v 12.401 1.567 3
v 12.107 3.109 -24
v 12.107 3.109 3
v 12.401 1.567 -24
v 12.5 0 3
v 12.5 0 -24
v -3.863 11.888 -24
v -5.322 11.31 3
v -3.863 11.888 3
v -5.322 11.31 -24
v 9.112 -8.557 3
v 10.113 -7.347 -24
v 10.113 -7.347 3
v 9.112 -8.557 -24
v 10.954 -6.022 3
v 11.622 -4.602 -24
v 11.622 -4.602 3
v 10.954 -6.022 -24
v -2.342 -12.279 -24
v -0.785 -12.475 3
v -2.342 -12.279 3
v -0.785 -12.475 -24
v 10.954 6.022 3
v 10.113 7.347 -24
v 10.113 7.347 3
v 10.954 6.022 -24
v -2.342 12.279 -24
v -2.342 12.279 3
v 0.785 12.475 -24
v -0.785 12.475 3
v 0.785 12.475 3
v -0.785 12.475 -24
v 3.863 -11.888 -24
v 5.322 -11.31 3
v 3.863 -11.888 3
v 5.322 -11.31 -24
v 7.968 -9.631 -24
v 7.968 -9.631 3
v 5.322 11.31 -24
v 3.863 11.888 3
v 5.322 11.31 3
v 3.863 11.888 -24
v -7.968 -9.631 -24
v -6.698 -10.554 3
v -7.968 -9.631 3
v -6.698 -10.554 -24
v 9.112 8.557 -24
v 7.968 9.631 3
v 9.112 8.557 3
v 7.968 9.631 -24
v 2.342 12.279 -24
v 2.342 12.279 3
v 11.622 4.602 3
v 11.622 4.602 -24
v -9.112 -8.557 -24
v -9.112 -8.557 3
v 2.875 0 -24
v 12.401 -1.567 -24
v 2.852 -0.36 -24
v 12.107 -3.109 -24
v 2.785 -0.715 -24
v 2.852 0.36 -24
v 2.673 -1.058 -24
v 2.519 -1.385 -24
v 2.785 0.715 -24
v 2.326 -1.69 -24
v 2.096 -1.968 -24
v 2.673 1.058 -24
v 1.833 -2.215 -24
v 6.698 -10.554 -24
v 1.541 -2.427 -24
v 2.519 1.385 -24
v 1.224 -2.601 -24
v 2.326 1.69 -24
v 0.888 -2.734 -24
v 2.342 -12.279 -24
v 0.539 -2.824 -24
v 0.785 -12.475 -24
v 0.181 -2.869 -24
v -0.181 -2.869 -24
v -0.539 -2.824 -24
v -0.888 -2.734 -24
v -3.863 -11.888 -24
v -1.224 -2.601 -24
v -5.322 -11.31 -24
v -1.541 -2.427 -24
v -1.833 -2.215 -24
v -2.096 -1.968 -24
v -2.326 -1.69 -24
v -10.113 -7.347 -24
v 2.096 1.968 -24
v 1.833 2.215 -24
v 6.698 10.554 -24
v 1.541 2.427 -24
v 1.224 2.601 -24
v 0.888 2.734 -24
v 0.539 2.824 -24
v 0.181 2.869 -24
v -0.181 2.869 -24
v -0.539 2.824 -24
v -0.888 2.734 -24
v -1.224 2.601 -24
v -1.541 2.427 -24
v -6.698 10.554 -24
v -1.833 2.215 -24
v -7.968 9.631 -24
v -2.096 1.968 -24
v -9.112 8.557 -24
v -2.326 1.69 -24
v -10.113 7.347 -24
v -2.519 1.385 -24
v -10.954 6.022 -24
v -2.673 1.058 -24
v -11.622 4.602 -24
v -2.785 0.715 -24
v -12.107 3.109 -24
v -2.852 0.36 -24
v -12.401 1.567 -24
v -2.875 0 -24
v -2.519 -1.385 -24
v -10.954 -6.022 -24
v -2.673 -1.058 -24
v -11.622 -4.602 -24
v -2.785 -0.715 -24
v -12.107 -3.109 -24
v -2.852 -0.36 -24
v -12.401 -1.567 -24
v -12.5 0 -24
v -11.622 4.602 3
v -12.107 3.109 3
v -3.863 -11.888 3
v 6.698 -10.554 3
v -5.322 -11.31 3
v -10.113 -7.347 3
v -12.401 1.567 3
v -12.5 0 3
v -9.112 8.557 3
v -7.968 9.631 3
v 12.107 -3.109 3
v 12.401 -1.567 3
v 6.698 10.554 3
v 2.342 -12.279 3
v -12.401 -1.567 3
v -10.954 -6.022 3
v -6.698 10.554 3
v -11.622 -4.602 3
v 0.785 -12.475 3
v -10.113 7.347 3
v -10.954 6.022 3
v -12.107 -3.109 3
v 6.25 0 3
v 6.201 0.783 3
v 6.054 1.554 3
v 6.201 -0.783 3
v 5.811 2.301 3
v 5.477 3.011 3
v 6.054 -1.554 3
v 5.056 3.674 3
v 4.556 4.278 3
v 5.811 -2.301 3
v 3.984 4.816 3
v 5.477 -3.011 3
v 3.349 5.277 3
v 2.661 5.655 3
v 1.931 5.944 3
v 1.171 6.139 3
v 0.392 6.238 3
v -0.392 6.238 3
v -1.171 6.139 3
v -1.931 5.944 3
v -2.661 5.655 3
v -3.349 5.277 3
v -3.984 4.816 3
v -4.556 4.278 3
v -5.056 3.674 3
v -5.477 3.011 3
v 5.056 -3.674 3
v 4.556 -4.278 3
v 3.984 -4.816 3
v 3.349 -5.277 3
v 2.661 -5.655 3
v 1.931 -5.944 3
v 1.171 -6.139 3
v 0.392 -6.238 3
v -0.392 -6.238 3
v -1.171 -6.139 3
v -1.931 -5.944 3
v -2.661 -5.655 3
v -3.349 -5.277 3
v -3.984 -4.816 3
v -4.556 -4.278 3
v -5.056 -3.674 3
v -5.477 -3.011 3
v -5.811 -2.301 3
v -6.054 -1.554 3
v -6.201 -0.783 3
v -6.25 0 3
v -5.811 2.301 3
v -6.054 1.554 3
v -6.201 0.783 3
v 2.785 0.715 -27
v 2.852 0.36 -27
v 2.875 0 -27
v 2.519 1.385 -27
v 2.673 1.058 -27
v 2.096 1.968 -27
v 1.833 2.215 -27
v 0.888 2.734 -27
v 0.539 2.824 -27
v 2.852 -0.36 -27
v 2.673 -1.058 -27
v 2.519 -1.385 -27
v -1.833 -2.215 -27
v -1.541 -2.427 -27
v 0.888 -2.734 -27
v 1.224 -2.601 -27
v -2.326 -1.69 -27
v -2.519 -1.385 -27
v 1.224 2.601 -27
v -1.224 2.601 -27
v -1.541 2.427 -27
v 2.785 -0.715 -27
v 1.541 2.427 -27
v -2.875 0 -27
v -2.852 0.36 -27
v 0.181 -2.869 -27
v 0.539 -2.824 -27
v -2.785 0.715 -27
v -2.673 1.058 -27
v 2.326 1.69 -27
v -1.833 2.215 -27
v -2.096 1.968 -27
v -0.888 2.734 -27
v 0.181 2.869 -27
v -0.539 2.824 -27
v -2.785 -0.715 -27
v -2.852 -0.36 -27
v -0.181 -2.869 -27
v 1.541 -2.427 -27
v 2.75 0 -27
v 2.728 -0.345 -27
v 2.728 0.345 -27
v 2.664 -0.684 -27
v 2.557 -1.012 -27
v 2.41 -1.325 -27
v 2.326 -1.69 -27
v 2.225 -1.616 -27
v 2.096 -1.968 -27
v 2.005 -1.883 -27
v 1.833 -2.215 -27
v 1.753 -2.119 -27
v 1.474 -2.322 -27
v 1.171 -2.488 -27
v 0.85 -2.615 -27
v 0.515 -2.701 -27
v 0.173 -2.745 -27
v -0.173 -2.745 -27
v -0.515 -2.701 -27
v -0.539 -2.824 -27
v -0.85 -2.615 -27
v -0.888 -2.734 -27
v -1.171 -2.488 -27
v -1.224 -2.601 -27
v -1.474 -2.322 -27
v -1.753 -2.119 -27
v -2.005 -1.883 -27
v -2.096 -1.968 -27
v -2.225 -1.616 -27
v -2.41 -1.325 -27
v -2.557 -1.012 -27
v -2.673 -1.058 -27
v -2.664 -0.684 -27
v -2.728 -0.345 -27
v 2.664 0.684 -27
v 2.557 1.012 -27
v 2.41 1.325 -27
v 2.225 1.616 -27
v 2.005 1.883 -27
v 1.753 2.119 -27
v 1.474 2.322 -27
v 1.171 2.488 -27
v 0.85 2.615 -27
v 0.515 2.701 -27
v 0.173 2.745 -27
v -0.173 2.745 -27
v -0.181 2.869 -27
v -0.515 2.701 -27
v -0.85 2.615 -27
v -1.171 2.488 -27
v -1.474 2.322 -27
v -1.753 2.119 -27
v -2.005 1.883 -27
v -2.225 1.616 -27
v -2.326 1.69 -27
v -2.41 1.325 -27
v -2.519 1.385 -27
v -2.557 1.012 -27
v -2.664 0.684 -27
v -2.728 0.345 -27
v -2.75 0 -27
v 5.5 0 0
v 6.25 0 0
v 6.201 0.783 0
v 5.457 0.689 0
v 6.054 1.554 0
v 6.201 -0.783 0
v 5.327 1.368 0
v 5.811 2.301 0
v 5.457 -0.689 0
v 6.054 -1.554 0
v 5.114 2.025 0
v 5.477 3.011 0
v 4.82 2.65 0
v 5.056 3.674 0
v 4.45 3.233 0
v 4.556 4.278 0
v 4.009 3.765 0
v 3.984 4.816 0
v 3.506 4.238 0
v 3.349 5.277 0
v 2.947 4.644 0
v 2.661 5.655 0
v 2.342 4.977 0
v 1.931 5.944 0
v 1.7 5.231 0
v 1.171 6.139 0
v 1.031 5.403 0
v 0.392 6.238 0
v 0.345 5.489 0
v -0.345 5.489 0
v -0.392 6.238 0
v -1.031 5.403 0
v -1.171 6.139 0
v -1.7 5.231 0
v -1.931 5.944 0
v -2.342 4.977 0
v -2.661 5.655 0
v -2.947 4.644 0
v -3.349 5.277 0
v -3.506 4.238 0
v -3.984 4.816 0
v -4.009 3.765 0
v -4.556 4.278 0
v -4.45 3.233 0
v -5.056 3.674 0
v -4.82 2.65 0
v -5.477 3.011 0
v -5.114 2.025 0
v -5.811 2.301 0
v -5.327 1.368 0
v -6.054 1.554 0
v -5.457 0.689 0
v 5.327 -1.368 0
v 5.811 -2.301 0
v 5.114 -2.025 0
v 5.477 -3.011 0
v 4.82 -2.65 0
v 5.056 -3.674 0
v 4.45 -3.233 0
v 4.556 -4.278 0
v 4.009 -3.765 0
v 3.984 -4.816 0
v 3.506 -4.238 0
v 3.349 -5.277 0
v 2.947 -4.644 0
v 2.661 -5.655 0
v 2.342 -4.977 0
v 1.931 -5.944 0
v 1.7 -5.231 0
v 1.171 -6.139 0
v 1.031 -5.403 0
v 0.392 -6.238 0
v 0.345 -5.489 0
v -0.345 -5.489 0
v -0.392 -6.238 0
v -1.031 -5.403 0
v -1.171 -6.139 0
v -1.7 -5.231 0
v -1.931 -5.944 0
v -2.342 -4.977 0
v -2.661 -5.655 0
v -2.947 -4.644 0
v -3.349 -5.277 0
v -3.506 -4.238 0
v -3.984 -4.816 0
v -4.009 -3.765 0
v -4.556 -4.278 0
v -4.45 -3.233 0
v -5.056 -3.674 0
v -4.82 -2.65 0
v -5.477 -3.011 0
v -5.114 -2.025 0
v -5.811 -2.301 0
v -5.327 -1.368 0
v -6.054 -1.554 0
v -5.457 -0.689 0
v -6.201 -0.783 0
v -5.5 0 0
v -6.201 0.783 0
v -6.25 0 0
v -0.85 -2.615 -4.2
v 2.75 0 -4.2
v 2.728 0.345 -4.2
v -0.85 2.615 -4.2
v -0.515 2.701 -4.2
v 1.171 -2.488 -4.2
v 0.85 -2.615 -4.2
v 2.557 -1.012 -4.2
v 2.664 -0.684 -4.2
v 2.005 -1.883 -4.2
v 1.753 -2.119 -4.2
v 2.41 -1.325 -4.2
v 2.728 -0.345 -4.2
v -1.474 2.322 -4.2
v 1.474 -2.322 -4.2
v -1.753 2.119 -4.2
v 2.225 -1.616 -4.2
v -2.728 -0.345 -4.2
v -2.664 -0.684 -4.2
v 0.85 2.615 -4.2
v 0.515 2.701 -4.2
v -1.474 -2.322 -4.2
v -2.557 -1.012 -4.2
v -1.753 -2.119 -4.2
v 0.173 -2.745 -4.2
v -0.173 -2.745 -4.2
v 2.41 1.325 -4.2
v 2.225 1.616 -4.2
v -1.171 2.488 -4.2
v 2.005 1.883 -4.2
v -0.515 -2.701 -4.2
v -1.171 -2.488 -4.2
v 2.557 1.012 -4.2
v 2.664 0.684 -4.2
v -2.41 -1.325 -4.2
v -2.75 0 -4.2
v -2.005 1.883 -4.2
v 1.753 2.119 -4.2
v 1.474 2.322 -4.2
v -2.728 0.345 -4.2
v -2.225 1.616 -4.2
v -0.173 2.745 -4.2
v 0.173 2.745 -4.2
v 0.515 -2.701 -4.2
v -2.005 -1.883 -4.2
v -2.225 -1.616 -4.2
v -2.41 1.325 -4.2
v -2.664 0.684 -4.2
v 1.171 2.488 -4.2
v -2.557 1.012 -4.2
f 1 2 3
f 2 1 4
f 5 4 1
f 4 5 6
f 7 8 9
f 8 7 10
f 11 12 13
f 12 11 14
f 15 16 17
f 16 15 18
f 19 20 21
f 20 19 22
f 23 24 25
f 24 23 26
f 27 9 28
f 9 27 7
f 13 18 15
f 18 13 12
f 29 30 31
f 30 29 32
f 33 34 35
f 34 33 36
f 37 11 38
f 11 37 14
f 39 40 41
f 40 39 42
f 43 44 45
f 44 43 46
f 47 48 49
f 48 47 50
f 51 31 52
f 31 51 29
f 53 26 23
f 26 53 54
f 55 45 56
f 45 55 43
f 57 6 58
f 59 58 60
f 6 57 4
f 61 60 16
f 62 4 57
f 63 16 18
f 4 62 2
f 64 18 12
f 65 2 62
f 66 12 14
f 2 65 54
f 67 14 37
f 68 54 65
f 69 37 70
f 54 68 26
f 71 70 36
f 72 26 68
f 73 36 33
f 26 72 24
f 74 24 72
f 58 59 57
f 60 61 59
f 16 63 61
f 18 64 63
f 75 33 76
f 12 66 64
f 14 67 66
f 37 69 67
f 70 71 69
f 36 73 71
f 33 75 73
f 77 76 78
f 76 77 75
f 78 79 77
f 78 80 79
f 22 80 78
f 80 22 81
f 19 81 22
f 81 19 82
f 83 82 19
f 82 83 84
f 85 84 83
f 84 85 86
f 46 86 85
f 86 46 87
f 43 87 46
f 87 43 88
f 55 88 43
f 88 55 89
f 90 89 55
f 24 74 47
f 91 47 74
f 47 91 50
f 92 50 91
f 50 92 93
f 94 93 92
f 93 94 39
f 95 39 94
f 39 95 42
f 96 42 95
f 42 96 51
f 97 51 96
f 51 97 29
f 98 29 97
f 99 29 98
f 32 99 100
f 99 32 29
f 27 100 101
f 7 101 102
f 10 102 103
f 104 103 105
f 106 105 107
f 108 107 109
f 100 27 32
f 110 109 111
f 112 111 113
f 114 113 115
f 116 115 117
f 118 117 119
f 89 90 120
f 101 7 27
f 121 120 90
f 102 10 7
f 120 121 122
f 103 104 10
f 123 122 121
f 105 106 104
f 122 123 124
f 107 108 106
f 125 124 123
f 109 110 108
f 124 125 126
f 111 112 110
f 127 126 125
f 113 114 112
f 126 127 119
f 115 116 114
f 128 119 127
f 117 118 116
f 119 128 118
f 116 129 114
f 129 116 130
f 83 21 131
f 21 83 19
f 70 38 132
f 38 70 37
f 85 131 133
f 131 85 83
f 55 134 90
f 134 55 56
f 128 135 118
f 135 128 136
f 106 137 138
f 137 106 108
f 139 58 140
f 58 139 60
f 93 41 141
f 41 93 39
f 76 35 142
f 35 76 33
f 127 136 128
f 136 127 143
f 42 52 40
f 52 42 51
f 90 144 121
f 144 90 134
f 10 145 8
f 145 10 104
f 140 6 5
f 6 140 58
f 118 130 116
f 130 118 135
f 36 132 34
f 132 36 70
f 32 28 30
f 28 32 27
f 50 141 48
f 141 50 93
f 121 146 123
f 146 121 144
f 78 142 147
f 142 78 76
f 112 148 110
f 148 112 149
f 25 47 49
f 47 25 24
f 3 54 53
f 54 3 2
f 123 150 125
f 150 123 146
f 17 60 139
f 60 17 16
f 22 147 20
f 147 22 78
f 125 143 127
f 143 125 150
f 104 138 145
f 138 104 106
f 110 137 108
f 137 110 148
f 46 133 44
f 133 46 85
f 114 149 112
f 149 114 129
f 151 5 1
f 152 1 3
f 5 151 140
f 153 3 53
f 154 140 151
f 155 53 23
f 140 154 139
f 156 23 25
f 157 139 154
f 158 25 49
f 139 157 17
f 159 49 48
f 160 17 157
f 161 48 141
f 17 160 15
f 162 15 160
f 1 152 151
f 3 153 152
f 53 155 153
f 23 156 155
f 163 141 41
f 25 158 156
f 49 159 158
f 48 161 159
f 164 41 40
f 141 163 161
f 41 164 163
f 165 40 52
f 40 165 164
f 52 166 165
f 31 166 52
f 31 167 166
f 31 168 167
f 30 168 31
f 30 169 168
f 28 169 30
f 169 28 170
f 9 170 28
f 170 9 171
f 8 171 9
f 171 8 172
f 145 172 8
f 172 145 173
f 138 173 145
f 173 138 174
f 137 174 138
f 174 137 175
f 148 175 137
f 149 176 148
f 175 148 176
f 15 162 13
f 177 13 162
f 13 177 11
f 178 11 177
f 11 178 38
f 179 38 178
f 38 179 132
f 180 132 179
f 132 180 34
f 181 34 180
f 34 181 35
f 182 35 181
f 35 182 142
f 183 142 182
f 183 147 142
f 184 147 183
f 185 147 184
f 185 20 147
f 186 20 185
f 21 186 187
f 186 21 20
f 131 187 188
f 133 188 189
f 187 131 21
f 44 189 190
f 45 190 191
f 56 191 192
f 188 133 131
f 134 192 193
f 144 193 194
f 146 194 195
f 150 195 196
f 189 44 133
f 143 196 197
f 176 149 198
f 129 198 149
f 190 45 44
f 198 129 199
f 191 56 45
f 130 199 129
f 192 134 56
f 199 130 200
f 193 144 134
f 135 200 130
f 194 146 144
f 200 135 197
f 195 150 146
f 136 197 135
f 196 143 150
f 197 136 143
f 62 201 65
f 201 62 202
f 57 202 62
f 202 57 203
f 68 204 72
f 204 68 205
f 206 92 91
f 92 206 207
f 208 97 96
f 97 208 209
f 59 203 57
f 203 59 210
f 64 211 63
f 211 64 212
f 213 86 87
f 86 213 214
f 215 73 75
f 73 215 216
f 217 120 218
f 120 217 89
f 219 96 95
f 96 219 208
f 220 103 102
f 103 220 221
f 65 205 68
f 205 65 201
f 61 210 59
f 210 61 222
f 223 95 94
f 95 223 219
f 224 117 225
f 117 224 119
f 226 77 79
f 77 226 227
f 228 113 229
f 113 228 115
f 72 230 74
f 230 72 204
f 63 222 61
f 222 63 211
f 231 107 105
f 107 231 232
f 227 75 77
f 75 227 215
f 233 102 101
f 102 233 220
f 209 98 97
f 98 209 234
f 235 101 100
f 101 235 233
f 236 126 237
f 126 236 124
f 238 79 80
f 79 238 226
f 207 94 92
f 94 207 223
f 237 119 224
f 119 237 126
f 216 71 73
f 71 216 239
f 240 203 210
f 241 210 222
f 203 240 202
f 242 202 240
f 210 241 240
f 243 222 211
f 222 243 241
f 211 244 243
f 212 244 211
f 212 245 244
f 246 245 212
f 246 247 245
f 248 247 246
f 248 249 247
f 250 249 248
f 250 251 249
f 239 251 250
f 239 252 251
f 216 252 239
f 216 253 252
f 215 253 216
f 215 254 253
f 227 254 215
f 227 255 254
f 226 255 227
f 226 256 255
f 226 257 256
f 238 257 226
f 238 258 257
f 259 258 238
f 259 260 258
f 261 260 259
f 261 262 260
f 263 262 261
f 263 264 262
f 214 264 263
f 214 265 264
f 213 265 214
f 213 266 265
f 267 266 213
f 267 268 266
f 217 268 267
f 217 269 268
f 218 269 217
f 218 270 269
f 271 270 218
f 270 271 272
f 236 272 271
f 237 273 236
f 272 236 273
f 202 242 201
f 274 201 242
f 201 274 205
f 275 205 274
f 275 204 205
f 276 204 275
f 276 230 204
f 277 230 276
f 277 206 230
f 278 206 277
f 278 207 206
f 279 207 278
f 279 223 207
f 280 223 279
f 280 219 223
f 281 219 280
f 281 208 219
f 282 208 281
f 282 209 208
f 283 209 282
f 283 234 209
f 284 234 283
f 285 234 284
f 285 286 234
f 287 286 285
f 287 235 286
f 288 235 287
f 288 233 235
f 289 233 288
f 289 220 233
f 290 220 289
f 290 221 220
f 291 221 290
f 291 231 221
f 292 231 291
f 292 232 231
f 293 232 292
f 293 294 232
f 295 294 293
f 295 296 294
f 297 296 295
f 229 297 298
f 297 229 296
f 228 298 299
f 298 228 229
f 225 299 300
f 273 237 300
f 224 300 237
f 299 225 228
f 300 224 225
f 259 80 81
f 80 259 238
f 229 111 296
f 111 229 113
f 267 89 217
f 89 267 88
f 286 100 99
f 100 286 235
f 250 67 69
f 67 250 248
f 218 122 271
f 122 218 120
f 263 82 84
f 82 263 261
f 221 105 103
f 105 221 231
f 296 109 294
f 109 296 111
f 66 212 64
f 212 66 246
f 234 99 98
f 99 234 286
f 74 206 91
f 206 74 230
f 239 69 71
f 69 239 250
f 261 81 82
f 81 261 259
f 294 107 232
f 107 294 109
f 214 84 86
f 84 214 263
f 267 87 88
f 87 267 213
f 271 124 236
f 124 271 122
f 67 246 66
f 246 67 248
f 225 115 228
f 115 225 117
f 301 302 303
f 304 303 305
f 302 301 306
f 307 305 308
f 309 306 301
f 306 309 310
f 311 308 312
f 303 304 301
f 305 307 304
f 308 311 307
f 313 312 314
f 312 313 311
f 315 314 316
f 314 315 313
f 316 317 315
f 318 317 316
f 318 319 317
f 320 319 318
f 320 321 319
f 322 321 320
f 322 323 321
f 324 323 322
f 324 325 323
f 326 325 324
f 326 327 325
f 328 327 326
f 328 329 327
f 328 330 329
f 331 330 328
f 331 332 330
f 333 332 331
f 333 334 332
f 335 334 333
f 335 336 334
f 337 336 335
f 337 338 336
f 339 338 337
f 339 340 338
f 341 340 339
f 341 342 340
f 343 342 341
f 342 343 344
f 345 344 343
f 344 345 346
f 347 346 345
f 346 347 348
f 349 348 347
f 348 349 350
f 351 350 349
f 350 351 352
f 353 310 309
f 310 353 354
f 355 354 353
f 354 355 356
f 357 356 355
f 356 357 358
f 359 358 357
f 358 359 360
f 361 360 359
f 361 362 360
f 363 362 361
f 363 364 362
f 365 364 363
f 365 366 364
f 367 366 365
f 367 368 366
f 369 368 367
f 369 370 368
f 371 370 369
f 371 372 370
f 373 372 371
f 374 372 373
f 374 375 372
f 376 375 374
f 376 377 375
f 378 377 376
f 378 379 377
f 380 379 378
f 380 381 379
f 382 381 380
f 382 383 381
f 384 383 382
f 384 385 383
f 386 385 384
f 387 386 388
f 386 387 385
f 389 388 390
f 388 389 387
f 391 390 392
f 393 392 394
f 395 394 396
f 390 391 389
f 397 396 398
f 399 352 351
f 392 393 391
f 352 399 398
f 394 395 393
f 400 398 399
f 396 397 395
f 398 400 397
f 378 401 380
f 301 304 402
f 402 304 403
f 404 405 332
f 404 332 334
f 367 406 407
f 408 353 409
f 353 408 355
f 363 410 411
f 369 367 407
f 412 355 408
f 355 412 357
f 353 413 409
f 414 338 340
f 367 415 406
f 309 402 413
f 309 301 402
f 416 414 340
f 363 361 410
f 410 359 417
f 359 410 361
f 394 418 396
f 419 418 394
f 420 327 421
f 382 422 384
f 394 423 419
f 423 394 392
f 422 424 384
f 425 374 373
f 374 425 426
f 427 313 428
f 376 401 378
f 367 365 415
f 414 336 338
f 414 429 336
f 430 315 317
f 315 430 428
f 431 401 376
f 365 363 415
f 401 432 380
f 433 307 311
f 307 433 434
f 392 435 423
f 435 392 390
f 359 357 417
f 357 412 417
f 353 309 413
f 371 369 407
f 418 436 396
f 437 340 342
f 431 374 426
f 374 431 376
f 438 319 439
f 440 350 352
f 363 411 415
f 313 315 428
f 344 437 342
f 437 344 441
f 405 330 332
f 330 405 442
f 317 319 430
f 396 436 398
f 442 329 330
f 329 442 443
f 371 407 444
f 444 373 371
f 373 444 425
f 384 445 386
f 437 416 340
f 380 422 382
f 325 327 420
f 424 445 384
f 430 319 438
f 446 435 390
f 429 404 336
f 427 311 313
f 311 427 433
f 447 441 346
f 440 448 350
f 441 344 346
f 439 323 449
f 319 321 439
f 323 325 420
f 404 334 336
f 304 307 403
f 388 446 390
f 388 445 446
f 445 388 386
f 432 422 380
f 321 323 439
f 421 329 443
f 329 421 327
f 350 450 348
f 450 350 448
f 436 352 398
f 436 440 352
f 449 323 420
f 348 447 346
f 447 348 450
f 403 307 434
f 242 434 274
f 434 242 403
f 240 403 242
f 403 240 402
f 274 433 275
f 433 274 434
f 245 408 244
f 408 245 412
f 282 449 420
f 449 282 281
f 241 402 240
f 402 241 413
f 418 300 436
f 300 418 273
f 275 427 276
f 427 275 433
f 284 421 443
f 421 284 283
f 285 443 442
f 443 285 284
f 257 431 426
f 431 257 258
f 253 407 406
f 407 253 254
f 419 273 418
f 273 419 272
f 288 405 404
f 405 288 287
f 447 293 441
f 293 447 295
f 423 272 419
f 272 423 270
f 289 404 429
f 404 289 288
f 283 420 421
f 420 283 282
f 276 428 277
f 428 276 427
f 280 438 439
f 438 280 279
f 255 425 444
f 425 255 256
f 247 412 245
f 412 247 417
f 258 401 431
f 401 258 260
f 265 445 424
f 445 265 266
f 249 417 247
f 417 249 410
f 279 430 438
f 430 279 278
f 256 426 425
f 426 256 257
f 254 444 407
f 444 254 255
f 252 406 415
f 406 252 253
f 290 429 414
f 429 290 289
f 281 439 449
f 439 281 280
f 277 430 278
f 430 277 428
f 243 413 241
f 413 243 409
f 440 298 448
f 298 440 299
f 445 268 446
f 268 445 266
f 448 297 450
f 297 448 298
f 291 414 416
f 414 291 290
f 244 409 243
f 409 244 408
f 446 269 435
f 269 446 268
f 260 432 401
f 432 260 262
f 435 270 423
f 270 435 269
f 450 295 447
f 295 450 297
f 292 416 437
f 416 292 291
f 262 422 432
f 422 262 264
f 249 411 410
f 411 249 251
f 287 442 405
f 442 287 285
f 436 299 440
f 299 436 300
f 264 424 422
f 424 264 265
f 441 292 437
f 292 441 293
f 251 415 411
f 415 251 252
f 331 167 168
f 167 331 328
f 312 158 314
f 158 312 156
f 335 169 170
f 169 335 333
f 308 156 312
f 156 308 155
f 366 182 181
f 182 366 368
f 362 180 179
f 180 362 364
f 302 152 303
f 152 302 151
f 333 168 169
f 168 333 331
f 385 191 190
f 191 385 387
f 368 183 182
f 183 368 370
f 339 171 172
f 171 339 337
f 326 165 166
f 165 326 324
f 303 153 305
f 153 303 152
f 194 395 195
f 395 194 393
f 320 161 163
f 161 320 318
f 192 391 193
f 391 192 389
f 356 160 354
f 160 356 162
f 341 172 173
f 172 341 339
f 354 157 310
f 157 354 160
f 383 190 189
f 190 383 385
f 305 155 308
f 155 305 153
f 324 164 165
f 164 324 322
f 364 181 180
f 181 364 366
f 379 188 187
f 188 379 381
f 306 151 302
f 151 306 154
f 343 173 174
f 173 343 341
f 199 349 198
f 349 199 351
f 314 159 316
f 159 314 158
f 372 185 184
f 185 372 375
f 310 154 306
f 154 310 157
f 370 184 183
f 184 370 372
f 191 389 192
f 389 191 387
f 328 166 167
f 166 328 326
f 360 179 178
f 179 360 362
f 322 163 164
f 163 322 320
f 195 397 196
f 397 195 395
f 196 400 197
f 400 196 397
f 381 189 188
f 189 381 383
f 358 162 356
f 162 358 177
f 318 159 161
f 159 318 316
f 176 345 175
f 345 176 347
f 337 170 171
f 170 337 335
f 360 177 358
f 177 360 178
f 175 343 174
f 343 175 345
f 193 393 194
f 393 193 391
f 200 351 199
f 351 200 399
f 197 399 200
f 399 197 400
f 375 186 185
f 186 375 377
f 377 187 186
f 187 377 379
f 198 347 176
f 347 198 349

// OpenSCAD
$fn = 50;


difference() {
	union() {
		translate(v = [0, 0, -24.0000000000]) {
			cylinder(h = 27, r = 12.5000000000);
		}
		#translate(v = [0, 0, -27.0000000000]) {
			cylinder(h = 27, r = 2.8750000000);
		}
	}
	union() {
		translate(v = [0, 0, 0]) {
			rotate(a = [0, 0, 0]) {
				difference() {
					union() {
						translate(v = [0, 0, -27.0000000000]) {
							cylinder(h = 27, r = 2.2500000000);
						}
						translate(v = [0, 0, -4.2000000000]) {
							cylinder(h = 4.2000000000, r1 = 2.7500000000, r2 = 5.5000000000);
						}
						translate(v = [0, 0, -27.0000000000]) {
							cylinder(h = 27, r = 2.7500000000);
						}
						translate(v = [0, 0, -27.0000000000]) {
							cylinder(h = 27, r = 2.2500000000);
						}
					}
					union();
				}
			}
		}
		#cylinder(h = 3, r = 6.2500000000);
	}
}
